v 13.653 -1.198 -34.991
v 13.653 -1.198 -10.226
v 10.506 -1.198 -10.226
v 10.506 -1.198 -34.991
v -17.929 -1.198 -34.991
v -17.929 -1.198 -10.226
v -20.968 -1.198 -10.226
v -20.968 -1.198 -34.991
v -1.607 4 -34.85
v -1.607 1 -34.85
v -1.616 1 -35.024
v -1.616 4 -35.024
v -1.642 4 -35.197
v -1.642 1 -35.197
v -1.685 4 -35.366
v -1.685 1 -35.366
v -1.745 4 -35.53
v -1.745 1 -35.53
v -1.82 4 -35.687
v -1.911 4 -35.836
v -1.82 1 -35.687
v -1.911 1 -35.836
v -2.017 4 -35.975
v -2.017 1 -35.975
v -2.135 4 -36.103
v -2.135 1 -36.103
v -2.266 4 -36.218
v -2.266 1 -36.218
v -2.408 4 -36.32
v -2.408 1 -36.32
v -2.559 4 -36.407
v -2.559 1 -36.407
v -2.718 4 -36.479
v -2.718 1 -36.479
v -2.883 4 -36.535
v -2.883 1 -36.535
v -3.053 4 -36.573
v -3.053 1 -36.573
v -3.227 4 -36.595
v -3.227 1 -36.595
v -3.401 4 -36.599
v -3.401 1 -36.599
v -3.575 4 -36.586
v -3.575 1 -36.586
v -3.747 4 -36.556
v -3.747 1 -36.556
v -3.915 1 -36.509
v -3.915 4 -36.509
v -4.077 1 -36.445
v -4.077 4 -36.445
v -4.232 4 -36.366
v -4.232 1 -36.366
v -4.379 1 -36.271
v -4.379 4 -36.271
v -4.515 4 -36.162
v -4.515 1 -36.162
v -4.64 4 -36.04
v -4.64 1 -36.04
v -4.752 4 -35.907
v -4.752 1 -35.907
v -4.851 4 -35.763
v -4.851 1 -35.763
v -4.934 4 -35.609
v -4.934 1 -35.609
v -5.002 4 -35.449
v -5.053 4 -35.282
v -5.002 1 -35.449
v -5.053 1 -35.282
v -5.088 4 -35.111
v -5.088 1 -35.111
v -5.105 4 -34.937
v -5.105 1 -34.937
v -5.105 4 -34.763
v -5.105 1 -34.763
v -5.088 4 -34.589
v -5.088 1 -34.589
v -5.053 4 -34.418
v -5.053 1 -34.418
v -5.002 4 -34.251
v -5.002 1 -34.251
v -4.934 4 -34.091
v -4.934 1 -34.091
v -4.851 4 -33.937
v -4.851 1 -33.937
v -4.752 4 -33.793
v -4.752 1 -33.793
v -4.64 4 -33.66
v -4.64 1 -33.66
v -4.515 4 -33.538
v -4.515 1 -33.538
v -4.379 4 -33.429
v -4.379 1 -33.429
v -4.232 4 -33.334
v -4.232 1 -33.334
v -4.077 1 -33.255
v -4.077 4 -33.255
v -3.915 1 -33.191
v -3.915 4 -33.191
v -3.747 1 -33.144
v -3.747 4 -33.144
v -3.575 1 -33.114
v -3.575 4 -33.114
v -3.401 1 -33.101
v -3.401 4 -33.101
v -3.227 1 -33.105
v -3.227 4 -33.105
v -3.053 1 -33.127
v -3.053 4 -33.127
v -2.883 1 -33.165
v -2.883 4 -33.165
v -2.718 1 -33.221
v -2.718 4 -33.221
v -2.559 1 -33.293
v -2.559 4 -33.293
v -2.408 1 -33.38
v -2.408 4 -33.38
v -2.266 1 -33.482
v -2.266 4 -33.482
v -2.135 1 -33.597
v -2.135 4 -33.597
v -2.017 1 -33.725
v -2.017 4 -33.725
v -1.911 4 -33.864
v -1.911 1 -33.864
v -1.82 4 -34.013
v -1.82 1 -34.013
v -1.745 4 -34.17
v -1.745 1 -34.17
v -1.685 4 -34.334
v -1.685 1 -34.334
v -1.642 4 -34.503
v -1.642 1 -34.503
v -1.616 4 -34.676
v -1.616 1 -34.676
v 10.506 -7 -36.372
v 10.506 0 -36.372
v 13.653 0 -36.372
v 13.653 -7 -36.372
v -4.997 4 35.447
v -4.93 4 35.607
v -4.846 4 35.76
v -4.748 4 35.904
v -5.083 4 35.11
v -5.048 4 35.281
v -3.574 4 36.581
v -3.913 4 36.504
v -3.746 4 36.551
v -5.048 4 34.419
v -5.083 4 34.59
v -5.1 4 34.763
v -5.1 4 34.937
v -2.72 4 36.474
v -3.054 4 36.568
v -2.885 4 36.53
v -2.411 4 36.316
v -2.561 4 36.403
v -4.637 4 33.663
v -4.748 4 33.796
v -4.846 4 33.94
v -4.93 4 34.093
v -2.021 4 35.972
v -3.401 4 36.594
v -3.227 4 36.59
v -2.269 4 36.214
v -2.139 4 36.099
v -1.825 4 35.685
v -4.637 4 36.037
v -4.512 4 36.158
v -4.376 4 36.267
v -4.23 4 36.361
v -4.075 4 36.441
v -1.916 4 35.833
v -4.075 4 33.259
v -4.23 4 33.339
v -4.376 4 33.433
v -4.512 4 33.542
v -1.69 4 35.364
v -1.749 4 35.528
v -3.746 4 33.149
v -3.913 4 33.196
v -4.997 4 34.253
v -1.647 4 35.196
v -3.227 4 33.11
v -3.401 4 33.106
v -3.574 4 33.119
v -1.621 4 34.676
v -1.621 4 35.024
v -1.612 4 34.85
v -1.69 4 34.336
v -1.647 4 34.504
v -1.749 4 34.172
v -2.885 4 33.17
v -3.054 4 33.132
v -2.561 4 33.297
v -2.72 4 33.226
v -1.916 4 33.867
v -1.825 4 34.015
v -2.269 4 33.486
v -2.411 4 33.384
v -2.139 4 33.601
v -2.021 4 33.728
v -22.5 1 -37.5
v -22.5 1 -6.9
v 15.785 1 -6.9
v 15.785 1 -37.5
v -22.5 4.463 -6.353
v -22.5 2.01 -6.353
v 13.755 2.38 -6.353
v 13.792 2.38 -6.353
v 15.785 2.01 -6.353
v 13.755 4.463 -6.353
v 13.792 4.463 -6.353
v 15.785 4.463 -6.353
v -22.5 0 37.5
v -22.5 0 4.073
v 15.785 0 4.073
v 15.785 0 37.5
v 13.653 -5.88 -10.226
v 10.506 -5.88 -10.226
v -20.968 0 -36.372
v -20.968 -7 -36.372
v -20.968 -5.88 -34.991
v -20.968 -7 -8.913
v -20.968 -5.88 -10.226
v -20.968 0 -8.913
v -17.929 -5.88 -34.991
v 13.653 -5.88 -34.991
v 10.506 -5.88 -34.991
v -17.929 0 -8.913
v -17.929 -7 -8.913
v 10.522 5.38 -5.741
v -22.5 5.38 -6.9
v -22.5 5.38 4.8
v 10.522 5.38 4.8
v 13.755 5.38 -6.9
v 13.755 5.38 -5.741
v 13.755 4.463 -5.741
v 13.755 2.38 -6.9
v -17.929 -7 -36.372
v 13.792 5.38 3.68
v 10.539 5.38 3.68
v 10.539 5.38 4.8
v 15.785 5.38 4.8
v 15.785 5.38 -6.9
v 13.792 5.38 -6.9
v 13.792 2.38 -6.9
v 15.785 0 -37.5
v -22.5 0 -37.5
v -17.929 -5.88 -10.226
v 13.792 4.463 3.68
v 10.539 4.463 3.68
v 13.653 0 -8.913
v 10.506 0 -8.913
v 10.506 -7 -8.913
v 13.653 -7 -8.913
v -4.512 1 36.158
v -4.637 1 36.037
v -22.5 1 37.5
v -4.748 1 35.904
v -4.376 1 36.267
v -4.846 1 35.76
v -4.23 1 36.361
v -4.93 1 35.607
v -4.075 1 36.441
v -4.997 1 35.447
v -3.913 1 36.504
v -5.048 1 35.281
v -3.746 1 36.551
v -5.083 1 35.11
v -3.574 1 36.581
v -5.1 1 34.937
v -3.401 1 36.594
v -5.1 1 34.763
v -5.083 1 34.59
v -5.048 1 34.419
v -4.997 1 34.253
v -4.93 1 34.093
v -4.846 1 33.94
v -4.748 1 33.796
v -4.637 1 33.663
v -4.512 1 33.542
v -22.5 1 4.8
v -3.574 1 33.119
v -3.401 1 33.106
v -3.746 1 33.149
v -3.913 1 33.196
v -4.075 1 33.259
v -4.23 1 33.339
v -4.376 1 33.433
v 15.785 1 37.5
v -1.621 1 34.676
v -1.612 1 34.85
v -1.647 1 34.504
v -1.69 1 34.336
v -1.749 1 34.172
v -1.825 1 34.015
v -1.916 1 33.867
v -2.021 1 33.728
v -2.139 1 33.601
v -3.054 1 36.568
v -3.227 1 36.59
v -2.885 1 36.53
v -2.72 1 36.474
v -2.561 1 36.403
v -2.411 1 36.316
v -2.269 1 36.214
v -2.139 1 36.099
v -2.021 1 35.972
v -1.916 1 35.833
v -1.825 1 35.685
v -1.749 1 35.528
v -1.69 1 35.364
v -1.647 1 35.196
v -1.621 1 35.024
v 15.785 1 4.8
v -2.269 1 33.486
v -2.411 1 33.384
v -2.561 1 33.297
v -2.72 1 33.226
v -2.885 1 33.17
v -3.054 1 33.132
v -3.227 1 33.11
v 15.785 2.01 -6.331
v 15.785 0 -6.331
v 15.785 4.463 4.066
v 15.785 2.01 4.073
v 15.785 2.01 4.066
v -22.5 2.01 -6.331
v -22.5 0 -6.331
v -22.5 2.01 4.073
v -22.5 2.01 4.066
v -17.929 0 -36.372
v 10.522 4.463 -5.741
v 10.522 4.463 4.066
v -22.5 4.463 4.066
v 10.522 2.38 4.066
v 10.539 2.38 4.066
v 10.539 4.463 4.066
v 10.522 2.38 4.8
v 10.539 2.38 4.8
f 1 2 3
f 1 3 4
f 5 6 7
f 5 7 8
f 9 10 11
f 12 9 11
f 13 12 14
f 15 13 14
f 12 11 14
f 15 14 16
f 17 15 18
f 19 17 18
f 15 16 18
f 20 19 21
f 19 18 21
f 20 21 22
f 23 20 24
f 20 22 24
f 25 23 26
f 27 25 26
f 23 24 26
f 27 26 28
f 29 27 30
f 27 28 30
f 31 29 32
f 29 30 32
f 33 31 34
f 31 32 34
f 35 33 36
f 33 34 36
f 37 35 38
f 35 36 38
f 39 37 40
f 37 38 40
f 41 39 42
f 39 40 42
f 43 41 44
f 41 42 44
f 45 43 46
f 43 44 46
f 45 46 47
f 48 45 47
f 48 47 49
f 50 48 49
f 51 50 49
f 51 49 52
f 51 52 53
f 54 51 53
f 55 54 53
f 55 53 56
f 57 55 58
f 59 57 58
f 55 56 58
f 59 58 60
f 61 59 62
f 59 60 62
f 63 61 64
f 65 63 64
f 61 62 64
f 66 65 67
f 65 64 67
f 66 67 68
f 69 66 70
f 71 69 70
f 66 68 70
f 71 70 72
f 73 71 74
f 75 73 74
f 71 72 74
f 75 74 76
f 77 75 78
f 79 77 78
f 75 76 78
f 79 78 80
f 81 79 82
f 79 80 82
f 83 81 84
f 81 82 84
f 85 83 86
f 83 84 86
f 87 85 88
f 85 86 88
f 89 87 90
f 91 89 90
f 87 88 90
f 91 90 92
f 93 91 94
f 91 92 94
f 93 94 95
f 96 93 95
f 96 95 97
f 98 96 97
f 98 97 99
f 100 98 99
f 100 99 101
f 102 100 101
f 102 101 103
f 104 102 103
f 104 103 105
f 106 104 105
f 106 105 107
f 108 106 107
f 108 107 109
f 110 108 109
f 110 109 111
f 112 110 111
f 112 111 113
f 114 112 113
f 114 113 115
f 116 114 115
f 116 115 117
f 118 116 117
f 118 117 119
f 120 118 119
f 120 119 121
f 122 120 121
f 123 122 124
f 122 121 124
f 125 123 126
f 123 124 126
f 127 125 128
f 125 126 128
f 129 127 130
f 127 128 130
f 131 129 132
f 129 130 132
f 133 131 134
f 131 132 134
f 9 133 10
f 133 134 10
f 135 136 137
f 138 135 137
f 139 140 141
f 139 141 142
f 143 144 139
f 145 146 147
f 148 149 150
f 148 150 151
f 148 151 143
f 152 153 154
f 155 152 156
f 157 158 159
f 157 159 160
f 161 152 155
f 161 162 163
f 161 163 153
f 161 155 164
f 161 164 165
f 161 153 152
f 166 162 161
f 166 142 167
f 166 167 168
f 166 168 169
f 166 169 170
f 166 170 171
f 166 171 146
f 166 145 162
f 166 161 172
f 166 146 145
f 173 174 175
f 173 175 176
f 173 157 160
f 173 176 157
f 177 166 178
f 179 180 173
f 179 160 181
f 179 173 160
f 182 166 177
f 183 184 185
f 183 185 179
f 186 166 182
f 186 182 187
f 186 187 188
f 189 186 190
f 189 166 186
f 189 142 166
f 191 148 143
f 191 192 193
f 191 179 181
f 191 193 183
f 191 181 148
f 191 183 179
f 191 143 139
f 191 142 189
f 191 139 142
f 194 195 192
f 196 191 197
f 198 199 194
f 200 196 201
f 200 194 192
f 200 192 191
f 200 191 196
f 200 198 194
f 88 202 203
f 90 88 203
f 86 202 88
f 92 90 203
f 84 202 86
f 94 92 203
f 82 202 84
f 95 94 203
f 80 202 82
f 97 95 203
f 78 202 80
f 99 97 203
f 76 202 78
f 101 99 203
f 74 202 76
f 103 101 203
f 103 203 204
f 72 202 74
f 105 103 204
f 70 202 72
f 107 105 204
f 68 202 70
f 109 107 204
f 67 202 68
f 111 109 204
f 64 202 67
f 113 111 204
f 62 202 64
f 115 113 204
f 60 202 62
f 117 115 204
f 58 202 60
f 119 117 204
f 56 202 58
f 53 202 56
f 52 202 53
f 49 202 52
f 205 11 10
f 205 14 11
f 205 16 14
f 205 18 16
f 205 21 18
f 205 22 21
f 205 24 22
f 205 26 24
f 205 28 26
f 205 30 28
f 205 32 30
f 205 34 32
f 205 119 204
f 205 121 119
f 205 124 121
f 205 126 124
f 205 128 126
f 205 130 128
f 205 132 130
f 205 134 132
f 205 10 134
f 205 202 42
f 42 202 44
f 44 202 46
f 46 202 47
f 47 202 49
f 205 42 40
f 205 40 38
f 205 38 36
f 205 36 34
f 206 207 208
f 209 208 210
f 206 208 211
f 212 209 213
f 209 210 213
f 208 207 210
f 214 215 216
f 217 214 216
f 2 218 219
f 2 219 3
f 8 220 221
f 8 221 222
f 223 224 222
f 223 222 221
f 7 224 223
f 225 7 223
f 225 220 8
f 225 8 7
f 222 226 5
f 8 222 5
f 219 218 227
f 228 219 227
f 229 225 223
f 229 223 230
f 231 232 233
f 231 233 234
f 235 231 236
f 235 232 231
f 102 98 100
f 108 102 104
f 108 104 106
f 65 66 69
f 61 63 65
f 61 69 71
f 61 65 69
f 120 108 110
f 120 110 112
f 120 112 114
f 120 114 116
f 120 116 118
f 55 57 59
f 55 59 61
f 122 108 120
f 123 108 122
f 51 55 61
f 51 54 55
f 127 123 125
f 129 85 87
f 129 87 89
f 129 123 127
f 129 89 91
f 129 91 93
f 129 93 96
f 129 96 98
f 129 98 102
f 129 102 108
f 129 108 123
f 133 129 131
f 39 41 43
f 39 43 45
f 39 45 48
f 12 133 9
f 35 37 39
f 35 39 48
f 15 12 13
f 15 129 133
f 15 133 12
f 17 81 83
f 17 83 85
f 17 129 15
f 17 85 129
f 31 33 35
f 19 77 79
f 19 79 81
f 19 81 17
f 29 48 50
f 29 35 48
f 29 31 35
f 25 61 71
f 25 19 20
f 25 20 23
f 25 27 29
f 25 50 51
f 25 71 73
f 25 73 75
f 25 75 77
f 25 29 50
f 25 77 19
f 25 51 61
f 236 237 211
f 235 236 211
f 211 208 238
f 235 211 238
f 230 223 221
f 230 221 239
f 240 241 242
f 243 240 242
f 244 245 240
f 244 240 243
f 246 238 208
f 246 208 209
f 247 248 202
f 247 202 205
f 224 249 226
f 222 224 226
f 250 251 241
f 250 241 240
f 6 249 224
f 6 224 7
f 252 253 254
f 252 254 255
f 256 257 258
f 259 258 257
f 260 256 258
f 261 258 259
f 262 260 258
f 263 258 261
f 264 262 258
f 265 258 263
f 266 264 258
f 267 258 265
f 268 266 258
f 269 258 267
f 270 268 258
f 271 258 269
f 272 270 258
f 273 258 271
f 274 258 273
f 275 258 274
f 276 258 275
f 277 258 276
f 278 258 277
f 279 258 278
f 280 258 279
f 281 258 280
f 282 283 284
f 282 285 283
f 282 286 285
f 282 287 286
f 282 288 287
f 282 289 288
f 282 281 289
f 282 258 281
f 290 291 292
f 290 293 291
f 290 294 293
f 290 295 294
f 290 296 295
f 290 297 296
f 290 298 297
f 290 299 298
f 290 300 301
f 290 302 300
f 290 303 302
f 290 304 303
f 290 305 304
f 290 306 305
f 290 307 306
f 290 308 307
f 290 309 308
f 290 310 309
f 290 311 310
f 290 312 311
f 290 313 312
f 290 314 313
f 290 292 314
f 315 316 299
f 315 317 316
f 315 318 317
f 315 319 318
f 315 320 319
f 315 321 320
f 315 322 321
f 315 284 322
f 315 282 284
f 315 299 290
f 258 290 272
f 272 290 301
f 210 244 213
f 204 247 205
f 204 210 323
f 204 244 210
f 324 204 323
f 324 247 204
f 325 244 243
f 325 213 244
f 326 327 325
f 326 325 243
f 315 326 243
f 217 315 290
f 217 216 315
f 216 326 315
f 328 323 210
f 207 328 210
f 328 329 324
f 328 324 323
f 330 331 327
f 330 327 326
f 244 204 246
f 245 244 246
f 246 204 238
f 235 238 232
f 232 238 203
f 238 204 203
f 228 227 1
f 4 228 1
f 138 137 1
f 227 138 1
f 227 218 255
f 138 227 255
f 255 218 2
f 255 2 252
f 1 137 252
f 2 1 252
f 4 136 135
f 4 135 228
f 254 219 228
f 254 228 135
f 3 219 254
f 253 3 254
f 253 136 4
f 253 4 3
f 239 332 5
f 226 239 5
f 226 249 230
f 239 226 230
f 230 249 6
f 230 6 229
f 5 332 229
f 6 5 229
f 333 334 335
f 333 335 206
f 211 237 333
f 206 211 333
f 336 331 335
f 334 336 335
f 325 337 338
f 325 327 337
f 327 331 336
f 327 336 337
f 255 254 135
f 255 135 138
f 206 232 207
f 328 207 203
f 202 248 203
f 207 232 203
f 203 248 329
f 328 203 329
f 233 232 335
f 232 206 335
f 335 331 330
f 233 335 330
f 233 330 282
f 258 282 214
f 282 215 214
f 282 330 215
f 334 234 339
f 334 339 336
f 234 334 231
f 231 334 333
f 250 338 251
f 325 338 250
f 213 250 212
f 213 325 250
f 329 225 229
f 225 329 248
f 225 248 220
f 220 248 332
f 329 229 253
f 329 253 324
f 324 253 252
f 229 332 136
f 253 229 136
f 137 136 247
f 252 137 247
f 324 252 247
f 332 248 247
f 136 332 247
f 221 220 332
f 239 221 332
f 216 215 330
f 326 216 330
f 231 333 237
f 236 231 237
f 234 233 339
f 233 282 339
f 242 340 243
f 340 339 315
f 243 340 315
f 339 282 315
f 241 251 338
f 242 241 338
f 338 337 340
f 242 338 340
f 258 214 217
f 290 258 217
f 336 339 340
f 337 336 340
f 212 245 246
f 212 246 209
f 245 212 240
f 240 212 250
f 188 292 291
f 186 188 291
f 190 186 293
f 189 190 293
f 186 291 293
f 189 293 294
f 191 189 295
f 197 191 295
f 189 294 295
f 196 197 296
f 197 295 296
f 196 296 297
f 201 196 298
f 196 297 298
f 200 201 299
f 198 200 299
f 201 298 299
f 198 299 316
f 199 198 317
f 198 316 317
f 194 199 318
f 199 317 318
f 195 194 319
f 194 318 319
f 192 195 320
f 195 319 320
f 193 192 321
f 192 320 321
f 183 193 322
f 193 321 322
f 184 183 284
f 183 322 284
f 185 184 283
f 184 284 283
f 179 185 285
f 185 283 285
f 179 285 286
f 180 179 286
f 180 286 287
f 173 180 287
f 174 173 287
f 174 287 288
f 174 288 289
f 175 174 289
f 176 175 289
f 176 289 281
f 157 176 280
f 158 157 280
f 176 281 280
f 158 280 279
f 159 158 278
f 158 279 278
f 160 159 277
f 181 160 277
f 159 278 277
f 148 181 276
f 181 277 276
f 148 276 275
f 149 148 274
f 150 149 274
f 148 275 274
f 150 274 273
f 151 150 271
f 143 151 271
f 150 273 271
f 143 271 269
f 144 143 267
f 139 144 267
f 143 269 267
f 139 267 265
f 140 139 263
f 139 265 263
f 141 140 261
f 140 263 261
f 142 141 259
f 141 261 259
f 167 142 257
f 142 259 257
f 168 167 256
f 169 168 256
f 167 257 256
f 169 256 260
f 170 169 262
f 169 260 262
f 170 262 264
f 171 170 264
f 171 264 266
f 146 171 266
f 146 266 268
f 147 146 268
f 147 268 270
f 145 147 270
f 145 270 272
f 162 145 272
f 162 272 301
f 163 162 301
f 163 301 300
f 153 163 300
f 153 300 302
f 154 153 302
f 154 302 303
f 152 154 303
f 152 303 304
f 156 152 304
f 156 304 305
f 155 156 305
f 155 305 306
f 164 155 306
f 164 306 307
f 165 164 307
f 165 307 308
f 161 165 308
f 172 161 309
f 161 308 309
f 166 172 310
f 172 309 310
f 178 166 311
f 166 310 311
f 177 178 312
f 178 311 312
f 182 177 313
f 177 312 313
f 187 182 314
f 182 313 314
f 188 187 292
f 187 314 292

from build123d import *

# Parameters (mm, degrees)
CROQUIS1_W              = 45
CROQUIS1_H              = 75
SALIENTE_EXTRUIR1_DEPTH = 1
CROQUIS2_W              = 45
CROQUIS2_H              = 11.7
SALIENTE_EXTRUIR2_DEPTH = 1.38
CROQUIS5_W              = 6.714746972
CROQUIS5_H              = 75
CORTAR_EXTRUIR2_DEPTH   = 38.3
CROQUIS7_R              = 1.75
CROQUIS7_R_2            = 1.745
SALIENTE_EXTRUIR3_DEPTH = 3
CROQUIS8_W              = 10.404122083
CROQUIS8_H              = 2.00964754
CORTAR_EXTRUIR3_DEPTH   = 40
CROQUIS9_W              = 3.216312559
CROQUIS9_H              = 9.421023217
CORTAR_EXTRUIR5_DEPTH   = 10
CROQUIS10_W             = 3.147375437
CROQUIS10_H             = 27.45813743
CROQUIS10_W_2           = 3.03884525
SALIENTE_EXTRUIR4_DEPTH = 7
CROQUIS11_W             = 24.765018181
CROQUIS11_H             = 4.681943735
CORTAR_EXTRUIR6_DEPTH   = 47
SALIENTE_EXTRUIR5_DEPTH = 3
CROQUIS13_W             = 10.418820836
CROQUIS13_H             = 2.453250219
CORTAR_EXTRUIR7_DEPTH   = 43


with BuildPart() as part:
    # Croquis1 → Saliente-Extruir1 (new body)
    with BuildSketch(Plane(origin=(0, 0, 0), x_dir=(1, 0, 0), z_dir=(0, 1, 0))):
        Rectangle(CROQUIS1_W, CROQUIS1_H)
    extrude(amount=SALIENTE_EXTRUIR1_DEPTH)

    # Croquis2 → Saliente-Extruir2 (add)
    with BuildSketch(Plane(origin=(0, 1, 0), x_dir=(1, 0, 0), z_dir=(0, 1, 0))):
        with Locations((0, 1.05)):
            Rectangle(CROQUIS2_W, CROQUIS2_H)
    extrude(amount=SALIENTE_EXTRUIR2_DEPTH)

    # Croquis5 → Cortar-Extruir2 (cut)
    with BuildSketch(Plane.XZ):
        with Locations((19.142626514, 0)):
            Rectangle(CROQUIS5_W, CROQUIS5_H)
    extrude(amount=-CORTAR_EXTRUIR2_DEPTH, mode=Mode.SUBTRACT)

    # Croquis7 → Saliente-Extruir3 (add)
    with BuildSketch(Plane(origin=(0, 1, 0), x_dir=(1, 0, 0), z_dir=(0, 1, 0))):
        with Locations((-3.357373486, 34.85)):
            Circle(CROQUIS7_R)
        with Locations((-3.357373486, -34.85)):
            Circle(CROQUIS7_R_2)
    extrude(amount=SALIENTE_EXTRUIR3_DEPTH)

    # Croquis8 → Cortar-Extruir3 (cut)
    with BuildSketch(Plane.ZY.offset(22.5)):
        with Locations((-1.128567076, 1.00482377)):
            Rectangle(CROQUIS8_W, CROQUIS8_H)
    extrude(amount=-CORTAR_EXTRUIR3_DEPTH, mode=Mode.SUBTRACT)

    # Croquis9 → Cortar-Extruir5 (cut)
    with BuildSketch(Plane.XZ.offset(-2.00964754)):
        with Locations((12.147096749, -1.030456008)):
            Rectangle(CROQUIS9_W, CROQUIS9_H)
    extrude(amount=-CORTAR_EXTRUIR5_DEPTH, mode=Mode.SUBTRACT)

    # Croquis10 → Saliente-Extruir4 (add)
    with BuildSketch(Plane.XZ):
        with Locations((12.079419824, -22.642531368)):
            Rectangle(CROQUIS10_W, CROQUIS10_H)
        with Locations((-19.448599637, -22.642531368)):
            Rectangle(CROQUIS10_W_2, CROQUIS10_H)
    extrude(amount=SALIENTE_EXTRUIR4_DEPTH)

    # Croquis11 → Cortar-Extruir6 (cut)
    with BuildSketch(Plane(origin=(13.653107542, 0, 0), x_dir=(0, 0, -1), z_dir=(1, 0, 0))):
        with Locations((22.608859882, -3.539167372)):
            Rectangle(CROQUIS11_W, CROQUIS11_H)
    extrude(amount=-CORTAR_EXTRUIR6_DEPTH, mode=Mode.SUBTRACT)

    # Croquis12 → Saliente-Extruir5 (add)
    with BuildSketch(Plane(origin=(0, 2.38, 0), x_dir=(1, 0, 0), z_dir=(0, 1, 0))):
        Polygon((10.521558479, 6.9), (-22.5, 6.9), (-22.5, -4.8), (10.521558479, -4.8), (10.521558479, 5.740967616), align=None)
        Polygon((13.755253028, 6.9), (10.521558479, 6.9), (10.521558479, 5.740967616), (10.538940469, 5.740967616), (13.755253028, 5.740967616), align=None)
        Polygon((15.785253028, 6.9), (13.792175248, 6.9), (13.792175248, -3.680055601), (13.792175248, -4.8), (15.785253028, -4.8), align=None)
        Polygon((10.538940469, -3.680055601), (10.538940469, -4.8), (13.792175248, -4.8), (13.792175248, -3.680055601), (13.755253028, -3.680055601), align=None)
    extrude(amount=SALIENTE_EXTRUIR5_DEPTH)

    # Croquis13 → Cortar-Extruir7 (cut)
    with BuildSketch(Plane(origin=(15.785253028, 0, 0), x_dir=(0, 0, -1), z_dir=(1, 0, 0))):
        with Locations((1.143850221, 3.23627265)):
            Rectangle(CROQUIS13_W, CROQUIS13_H)
    extrude(amount=-CORTAR_EXTRUIR7_DEPTH, mode=Mode.SUBTRACT)


solid = part.part
